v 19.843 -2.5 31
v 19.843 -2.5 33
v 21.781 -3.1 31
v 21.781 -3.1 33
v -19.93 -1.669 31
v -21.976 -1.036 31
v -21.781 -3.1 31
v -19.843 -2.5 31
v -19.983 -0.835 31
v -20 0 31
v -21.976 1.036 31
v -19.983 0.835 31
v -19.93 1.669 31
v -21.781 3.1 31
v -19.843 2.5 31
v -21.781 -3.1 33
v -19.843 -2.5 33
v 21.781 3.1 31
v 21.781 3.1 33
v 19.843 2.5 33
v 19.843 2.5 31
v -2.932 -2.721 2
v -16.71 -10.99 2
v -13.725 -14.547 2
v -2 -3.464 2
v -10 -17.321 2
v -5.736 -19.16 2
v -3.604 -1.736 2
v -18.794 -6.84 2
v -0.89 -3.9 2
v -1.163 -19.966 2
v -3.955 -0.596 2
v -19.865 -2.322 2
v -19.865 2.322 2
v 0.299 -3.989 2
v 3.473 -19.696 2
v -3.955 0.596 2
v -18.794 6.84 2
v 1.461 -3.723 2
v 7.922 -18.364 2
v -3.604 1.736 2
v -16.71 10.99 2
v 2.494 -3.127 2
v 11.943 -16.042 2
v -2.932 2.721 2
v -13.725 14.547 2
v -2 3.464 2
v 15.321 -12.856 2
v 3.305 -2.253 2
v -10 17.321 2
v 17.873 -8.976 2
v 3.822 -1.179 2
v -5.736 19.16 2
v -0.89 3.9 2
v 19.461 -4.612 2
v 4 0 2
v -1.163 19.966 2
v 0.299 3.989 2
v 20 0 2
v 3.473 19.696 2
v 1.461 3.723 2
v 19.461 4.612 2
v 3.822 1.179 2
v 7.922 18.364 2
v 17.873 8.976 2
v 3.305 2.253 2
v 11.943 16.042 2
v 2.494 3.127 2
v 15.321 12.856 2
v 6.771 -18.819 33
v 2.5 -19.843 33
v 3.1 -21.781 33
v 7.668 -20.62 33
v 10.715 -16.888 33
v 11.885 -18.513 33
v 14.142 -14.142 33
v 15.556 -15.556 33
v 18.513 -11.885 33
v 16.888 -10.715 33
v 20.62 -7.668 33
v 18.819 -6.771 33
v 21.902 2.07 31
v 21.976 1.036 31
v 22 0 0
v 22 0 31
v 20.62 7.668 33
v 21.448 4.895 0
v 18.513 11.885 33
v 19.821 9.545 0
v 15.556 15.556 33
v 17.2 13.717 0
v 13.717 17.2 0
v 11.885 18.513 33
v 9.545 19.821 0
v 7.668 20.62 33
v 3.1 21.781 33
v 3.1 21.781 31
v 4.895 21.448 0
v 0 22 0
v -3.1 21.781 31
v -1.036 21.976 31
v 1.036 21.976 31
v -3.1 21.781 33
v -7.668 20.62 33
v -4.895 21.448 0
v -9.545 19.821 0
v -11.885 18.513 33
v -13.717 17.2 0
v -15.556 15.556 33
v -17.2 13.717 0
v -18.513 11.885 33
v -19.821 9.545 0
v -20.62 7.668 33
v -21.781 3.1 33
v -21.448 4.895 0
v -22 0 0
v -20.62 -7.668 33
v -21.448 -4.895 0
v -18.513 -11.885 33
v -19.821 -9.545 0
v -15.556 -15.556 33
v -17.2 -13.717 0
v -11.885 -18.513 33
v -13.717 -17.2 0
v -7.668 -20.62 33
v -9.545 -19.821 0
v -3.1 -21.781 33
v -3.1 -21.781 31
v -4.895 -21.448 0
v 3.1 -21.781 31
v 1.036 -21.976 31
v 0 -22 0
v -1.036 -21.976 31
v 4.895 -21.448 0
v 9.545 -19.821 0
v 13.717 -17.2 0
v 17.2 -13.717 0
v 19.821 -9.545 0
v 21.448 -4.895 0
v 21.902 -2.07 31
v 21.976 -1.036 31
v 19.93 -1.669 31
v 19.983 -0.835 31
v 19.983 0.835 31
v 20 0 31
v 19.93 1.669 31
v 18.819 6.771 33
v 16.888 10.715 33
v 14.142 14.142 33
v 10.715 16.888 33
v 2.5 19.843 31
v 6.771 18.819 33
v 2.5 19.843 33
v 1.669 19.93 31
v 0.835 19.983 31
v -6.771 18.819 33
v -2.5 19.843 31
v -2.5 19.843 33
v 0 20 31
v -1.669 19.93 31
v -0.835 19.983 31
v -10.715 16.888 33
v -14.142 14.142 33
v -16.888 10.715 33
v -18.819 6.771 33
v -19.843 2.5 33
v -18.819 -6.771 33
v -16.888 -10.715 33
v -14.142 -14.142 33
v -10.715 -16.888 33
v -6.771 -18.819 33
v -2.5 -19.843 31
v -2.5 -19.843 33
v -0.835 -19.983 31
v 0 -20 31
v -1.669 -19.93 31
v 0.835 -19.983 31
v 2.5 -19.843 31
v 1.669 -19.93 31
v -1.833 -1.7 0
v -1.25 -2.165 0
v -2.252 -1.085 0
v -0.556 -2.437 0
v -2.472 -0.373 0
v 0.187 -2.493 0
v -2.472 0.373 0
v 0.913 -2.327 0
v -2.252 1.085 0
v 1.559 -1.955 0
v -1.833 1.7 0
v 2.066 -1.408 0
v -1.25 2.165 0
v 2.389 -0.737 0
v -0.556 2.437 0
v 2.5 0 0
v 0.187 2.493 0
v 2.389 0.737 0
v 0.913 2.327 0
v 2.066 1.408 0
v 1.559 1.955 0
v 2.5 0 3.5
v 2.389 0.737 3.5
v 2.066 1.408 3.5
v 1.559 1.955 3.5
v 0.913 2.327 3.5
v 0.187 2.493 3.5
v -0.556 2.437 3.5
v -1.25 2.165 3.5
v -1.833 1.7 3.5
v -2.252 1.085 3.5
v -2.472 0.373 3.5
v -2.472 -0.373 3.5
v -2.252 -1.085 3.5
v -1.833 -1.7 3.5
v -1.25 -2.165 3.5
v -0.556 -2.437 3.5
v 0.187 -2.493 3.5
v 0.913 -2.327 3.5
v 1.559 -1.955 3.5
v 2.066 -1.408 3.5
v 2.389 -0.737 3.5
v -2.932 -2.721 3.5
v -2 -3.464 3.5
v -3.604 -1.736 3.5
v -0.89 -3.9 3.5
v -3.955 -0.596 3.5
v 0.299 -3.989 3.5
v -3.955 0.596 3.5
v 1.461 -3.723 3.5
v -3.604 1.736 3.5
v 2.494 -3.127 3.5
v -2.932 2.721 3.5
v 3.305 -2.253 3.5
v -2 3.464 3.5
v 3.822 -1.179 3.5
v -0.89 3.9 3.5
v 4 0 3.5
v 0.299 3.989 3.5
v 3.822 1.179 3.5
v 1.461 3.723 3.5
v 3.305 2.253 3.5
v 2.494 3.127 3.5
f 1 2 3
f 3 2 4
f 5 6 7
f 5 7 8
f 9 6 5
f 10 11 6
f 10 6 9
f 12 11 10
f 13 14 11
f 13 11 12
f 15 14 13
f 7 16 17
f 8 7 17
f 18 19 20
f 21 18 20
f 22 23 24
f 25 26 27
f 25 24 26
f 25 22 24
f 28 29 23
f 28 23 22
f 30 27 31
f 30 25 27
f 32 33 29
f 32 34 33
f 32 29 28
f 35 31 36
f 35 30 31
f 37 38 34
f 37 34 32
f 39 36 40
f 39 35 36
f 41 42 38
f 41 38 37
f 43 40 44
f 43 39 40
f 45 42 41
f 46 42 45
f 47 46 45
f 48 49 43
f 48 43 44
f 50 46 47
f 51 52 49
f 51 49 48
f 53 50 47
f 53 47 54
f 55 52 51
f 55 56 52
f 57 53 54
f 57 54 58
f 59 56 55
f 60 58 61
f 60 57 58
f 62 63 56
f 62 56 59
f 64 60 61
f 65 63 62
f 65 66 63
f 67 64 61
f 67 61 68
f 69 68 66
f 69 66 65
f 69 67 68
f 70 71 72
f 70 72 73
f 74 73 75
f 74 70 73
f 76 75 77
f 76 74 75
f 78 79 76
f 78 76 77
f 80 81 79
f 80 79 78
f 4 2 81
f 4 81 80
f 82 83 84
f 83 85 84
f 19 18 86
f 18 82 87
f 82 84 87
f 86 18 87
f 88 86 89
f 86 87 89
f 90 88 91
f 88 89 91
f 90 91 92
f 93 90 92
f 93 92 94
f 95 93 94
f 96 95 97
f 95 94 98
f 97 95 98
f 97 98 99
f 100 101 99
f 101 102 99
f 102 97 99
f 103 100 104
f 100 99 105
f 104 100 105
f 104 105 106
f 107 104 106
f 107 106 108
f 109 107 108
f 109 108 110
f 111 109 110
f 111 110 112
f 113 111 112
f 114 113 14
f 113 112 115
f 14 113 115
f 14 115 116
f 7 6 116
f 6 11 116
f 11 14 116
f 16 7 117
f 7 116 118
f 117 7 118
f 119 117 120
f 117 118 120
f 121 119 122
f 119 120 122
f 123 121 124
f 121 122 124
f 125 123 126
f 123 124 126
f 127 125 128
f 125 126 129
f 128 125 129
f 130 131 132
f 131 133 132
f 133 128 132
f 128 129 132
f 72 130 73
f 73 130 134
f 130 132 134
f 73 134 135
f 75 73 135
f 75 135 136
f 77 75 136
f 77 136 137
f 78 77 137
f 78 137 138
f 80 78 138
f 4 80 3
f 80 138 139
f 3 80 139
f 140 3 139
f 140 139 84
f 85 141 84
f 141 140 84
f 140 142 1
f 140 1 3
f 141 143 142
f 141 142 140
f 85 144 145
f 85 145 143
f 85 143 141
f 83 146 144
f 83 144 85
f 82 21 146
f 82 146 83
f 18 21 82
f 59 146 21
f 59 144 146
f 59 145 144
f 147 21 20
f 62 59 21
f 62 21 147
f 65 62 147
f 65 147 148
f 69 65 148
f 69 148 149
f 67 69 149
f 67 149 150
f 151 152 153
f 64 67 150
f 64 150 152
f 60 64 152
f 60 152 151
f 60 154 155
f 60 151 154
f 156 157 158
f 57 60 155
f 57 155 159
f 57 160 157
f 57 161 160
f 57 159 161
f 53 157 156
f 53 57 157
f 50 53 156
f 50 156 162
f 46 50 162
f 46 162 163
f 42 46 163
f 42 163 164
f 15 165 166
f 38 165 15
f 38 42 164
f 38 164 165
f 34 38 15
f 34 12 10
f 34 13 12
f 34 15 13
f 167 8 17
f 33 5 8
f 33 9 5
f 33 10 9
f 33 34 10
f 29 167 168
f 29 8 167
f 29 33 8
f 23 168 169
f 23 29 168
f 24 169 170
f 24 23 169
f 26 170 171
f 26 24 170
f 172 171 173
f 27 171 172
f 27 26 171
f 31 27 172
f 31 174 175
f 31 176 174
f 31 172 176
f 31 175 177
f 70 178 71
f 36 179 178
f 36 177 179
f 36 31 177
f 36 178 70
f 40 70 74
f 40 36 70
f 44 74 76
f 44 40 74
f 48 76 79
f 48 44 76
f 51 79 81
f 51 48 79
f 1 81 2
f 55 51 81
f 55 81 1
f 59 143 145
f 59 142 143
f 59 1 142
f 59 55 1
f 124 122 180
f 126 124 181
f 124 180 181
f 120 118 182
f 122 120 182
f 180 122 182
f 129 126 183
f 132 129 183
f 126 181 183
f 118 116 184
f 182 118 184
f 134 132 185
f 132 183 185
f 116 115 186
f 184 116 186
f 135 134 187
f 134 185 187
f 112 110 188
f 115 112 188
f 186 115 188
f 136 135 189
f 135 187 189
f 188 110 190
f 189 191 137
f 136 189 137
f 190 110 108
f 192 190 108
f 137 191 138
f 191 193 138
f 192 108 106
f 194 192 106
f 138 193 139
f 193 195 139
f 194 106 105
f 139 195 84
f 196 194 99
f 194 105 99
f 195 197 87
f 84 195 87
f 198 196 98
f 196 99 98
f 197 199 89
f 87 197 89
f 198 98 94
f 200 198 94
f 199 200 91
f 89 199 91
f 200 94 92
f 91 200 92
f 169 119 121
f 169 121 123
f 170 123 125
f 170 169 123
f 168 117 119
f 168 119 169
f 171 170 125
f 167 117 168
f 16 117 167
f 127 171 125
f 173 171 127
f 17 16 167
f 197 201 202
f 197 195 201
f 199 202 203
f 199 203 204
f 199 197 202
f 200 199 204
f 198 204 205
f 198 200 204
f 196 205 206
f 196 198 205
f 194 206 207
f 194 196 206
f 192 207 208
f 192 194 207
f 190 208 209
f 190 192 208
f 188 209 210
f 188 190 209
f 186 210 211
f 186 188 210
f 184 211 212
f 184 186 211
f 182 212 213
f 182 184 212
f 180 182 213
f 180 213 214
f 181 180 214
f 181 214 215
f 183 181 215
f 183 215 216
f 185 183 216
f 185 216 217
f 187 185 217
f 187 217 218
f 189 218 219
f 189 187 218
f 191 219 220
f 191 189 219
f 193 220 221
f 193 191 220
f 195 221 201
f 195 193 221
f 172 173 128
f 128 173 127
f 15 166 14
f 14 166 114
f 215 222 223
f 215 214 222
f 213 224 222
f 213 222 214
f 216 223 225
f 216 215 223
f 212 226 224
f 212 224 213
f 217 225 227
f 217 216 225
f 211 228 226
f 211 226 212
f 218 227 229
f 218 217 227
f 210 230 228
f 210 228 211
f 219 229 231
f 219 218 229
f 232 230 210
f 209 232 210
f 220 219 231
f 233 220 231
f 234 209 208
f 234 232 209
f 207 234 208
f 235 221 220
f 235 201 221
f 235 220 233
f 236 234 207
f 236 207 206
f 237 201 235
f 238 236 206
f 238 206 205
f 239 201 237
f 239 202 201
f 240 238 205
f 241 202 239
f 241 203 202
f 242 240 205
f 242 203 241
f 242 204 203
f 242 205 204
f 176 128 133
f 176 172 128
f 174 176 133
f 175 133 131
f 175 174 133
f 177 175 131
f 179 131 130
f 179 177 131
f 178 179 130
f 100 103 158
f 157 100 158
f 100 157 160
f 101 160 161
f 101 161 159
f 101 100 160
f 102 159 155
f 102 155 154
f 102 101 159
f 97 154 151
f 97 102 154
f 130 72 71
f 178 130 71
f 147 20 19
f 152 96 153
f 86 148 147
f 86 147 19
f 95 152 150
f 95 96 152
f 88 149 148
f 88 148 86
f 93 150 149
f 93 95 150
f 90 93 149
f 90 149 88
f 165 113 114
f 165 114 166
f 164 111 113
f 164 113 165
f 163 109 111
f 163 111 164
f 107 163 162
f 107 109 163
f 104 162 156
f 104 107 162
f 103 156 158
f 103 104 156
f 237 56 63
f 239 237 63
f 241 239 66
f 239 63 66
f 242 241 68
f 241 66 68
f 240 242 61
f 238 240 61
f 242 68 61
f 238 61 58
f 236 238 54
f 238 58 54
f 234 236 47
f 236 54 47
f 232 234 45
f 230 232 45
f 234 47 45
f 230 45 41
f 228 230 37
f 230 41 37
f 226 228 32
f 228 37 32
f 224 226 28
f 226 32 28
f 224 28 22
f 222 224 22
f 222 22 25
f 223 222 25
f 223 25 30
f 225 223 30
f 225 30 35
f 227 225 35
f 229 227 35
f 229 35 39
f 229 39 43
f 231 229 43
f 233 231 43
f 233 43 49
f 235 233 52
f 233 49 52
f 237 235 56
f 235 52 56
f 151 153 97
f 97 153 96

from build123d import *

# Parameters (mm, degrees)
F0_R     = 22
F0_R_2   = 20
F1_DEPTH = 33
F2_R     = 22
F2_R_2   = 2.5
F3_DEPTH = 2
F5_DEPTH = 2
F6_R     = 4
F6_R_2   = 2.5
F7_DEPTH = 1.5


with BuildPart() as f1:
    # F0 (on Top) → F1 (new body)
    with BuildSketch(Plane.XY):
        Circle(F0_R)
        Circle(F0_R_2, mode=Mode.SUBTRACT)
    extrude(amount=F1_DEPTH)

    # F2 (on Top) → F3 (join)
    with BuildSketch(Plane.XY):
        Circle(F2_R)
        Circle(F2_R_2, mode=Mode.SUBTRACT)
    extrude(amount=F3_DEPTH)

    # F4 (on face) → F5 (cut)
    with BuildSketch(Plane.XY.offset(33)):
        with BuildLine():
            Line((-3.106676, 21.803428), (-2.5, 19.843135))
            ThreePointArc((-2.5, 19.843135), (-1.252458, 19.960745), (0, 20))
            ThreePointArc((0, 20), (1.252458, 19.960745), (2.5, 19.843135))
            Line((2.5, 19.843135), (3.106676, 21.803428))
            ThreePointArc((3.106676, 21.803428), (0, 22.023645), (-3.106676, 21.803428))
        make_face()
        with BuildLine():
            Line((-21.803428, -3.106676), (-19.843135, -2.5))
            ThreePointArc((-19.843135, -2.5), (-19.960745, -1.252458), (-20, 0))
            ThreePointArc((-20, 0), (-19.960745, 1.252458), (-19.843135, 2.5))
            Line((-19.843135, 2.5), (-21.803428, 3.106676))
            ThreePointArc((-21.803428, 3.106676), (-22.023645, 0), (-21.803428, -3.106676))
        make_face()
        with BuildLine():
            Line((3.106676, -21.803428), (2.5, -19.843135))
            ThreePointArc((2.5, -19.843135), (1.252458, -19.960745), (0, -20))
            ThreePointArc((0, -20), (-1.252458, -19.960745), (-2.5, -19.843135))
            Line((-2.5, -19.843135), (-3.106676, -21.803428))
            ThreePointArc((-3.106676, -21.803428), (0, -22.023645), (3.106676, -21.803428))
        make_face()
        with BuildLine():
            Line((21.803428, 3.106676), (19.843135, 2.5))
            ThreePointArc((19.843135, 2.5), (19.960745, 1.252458), (20, 0))
            ThreePointArc((20, 0), (19.960745, -1.252458), (19.843135, -2.5))
            Line((19.843135, -2.5), (21.803428, -3.106676))
            ThreePointArc((21.803428, -3.106676), (22.023645, 0), (21.803428, 3.106676))
        make_face()
    extrude(amount=-F5_DEPTH, mode=Mode.SUBTRACT)

    # F6 (on face) → F7 (join)
    with BuildSketch(Plane.XY.offset(2)):
        Circle(F6_R)
        Circle(F6_R_2, mode=Mode.SUBTRACT)
    extrude(amount=F7_DEPTH)


solid = f1.part
